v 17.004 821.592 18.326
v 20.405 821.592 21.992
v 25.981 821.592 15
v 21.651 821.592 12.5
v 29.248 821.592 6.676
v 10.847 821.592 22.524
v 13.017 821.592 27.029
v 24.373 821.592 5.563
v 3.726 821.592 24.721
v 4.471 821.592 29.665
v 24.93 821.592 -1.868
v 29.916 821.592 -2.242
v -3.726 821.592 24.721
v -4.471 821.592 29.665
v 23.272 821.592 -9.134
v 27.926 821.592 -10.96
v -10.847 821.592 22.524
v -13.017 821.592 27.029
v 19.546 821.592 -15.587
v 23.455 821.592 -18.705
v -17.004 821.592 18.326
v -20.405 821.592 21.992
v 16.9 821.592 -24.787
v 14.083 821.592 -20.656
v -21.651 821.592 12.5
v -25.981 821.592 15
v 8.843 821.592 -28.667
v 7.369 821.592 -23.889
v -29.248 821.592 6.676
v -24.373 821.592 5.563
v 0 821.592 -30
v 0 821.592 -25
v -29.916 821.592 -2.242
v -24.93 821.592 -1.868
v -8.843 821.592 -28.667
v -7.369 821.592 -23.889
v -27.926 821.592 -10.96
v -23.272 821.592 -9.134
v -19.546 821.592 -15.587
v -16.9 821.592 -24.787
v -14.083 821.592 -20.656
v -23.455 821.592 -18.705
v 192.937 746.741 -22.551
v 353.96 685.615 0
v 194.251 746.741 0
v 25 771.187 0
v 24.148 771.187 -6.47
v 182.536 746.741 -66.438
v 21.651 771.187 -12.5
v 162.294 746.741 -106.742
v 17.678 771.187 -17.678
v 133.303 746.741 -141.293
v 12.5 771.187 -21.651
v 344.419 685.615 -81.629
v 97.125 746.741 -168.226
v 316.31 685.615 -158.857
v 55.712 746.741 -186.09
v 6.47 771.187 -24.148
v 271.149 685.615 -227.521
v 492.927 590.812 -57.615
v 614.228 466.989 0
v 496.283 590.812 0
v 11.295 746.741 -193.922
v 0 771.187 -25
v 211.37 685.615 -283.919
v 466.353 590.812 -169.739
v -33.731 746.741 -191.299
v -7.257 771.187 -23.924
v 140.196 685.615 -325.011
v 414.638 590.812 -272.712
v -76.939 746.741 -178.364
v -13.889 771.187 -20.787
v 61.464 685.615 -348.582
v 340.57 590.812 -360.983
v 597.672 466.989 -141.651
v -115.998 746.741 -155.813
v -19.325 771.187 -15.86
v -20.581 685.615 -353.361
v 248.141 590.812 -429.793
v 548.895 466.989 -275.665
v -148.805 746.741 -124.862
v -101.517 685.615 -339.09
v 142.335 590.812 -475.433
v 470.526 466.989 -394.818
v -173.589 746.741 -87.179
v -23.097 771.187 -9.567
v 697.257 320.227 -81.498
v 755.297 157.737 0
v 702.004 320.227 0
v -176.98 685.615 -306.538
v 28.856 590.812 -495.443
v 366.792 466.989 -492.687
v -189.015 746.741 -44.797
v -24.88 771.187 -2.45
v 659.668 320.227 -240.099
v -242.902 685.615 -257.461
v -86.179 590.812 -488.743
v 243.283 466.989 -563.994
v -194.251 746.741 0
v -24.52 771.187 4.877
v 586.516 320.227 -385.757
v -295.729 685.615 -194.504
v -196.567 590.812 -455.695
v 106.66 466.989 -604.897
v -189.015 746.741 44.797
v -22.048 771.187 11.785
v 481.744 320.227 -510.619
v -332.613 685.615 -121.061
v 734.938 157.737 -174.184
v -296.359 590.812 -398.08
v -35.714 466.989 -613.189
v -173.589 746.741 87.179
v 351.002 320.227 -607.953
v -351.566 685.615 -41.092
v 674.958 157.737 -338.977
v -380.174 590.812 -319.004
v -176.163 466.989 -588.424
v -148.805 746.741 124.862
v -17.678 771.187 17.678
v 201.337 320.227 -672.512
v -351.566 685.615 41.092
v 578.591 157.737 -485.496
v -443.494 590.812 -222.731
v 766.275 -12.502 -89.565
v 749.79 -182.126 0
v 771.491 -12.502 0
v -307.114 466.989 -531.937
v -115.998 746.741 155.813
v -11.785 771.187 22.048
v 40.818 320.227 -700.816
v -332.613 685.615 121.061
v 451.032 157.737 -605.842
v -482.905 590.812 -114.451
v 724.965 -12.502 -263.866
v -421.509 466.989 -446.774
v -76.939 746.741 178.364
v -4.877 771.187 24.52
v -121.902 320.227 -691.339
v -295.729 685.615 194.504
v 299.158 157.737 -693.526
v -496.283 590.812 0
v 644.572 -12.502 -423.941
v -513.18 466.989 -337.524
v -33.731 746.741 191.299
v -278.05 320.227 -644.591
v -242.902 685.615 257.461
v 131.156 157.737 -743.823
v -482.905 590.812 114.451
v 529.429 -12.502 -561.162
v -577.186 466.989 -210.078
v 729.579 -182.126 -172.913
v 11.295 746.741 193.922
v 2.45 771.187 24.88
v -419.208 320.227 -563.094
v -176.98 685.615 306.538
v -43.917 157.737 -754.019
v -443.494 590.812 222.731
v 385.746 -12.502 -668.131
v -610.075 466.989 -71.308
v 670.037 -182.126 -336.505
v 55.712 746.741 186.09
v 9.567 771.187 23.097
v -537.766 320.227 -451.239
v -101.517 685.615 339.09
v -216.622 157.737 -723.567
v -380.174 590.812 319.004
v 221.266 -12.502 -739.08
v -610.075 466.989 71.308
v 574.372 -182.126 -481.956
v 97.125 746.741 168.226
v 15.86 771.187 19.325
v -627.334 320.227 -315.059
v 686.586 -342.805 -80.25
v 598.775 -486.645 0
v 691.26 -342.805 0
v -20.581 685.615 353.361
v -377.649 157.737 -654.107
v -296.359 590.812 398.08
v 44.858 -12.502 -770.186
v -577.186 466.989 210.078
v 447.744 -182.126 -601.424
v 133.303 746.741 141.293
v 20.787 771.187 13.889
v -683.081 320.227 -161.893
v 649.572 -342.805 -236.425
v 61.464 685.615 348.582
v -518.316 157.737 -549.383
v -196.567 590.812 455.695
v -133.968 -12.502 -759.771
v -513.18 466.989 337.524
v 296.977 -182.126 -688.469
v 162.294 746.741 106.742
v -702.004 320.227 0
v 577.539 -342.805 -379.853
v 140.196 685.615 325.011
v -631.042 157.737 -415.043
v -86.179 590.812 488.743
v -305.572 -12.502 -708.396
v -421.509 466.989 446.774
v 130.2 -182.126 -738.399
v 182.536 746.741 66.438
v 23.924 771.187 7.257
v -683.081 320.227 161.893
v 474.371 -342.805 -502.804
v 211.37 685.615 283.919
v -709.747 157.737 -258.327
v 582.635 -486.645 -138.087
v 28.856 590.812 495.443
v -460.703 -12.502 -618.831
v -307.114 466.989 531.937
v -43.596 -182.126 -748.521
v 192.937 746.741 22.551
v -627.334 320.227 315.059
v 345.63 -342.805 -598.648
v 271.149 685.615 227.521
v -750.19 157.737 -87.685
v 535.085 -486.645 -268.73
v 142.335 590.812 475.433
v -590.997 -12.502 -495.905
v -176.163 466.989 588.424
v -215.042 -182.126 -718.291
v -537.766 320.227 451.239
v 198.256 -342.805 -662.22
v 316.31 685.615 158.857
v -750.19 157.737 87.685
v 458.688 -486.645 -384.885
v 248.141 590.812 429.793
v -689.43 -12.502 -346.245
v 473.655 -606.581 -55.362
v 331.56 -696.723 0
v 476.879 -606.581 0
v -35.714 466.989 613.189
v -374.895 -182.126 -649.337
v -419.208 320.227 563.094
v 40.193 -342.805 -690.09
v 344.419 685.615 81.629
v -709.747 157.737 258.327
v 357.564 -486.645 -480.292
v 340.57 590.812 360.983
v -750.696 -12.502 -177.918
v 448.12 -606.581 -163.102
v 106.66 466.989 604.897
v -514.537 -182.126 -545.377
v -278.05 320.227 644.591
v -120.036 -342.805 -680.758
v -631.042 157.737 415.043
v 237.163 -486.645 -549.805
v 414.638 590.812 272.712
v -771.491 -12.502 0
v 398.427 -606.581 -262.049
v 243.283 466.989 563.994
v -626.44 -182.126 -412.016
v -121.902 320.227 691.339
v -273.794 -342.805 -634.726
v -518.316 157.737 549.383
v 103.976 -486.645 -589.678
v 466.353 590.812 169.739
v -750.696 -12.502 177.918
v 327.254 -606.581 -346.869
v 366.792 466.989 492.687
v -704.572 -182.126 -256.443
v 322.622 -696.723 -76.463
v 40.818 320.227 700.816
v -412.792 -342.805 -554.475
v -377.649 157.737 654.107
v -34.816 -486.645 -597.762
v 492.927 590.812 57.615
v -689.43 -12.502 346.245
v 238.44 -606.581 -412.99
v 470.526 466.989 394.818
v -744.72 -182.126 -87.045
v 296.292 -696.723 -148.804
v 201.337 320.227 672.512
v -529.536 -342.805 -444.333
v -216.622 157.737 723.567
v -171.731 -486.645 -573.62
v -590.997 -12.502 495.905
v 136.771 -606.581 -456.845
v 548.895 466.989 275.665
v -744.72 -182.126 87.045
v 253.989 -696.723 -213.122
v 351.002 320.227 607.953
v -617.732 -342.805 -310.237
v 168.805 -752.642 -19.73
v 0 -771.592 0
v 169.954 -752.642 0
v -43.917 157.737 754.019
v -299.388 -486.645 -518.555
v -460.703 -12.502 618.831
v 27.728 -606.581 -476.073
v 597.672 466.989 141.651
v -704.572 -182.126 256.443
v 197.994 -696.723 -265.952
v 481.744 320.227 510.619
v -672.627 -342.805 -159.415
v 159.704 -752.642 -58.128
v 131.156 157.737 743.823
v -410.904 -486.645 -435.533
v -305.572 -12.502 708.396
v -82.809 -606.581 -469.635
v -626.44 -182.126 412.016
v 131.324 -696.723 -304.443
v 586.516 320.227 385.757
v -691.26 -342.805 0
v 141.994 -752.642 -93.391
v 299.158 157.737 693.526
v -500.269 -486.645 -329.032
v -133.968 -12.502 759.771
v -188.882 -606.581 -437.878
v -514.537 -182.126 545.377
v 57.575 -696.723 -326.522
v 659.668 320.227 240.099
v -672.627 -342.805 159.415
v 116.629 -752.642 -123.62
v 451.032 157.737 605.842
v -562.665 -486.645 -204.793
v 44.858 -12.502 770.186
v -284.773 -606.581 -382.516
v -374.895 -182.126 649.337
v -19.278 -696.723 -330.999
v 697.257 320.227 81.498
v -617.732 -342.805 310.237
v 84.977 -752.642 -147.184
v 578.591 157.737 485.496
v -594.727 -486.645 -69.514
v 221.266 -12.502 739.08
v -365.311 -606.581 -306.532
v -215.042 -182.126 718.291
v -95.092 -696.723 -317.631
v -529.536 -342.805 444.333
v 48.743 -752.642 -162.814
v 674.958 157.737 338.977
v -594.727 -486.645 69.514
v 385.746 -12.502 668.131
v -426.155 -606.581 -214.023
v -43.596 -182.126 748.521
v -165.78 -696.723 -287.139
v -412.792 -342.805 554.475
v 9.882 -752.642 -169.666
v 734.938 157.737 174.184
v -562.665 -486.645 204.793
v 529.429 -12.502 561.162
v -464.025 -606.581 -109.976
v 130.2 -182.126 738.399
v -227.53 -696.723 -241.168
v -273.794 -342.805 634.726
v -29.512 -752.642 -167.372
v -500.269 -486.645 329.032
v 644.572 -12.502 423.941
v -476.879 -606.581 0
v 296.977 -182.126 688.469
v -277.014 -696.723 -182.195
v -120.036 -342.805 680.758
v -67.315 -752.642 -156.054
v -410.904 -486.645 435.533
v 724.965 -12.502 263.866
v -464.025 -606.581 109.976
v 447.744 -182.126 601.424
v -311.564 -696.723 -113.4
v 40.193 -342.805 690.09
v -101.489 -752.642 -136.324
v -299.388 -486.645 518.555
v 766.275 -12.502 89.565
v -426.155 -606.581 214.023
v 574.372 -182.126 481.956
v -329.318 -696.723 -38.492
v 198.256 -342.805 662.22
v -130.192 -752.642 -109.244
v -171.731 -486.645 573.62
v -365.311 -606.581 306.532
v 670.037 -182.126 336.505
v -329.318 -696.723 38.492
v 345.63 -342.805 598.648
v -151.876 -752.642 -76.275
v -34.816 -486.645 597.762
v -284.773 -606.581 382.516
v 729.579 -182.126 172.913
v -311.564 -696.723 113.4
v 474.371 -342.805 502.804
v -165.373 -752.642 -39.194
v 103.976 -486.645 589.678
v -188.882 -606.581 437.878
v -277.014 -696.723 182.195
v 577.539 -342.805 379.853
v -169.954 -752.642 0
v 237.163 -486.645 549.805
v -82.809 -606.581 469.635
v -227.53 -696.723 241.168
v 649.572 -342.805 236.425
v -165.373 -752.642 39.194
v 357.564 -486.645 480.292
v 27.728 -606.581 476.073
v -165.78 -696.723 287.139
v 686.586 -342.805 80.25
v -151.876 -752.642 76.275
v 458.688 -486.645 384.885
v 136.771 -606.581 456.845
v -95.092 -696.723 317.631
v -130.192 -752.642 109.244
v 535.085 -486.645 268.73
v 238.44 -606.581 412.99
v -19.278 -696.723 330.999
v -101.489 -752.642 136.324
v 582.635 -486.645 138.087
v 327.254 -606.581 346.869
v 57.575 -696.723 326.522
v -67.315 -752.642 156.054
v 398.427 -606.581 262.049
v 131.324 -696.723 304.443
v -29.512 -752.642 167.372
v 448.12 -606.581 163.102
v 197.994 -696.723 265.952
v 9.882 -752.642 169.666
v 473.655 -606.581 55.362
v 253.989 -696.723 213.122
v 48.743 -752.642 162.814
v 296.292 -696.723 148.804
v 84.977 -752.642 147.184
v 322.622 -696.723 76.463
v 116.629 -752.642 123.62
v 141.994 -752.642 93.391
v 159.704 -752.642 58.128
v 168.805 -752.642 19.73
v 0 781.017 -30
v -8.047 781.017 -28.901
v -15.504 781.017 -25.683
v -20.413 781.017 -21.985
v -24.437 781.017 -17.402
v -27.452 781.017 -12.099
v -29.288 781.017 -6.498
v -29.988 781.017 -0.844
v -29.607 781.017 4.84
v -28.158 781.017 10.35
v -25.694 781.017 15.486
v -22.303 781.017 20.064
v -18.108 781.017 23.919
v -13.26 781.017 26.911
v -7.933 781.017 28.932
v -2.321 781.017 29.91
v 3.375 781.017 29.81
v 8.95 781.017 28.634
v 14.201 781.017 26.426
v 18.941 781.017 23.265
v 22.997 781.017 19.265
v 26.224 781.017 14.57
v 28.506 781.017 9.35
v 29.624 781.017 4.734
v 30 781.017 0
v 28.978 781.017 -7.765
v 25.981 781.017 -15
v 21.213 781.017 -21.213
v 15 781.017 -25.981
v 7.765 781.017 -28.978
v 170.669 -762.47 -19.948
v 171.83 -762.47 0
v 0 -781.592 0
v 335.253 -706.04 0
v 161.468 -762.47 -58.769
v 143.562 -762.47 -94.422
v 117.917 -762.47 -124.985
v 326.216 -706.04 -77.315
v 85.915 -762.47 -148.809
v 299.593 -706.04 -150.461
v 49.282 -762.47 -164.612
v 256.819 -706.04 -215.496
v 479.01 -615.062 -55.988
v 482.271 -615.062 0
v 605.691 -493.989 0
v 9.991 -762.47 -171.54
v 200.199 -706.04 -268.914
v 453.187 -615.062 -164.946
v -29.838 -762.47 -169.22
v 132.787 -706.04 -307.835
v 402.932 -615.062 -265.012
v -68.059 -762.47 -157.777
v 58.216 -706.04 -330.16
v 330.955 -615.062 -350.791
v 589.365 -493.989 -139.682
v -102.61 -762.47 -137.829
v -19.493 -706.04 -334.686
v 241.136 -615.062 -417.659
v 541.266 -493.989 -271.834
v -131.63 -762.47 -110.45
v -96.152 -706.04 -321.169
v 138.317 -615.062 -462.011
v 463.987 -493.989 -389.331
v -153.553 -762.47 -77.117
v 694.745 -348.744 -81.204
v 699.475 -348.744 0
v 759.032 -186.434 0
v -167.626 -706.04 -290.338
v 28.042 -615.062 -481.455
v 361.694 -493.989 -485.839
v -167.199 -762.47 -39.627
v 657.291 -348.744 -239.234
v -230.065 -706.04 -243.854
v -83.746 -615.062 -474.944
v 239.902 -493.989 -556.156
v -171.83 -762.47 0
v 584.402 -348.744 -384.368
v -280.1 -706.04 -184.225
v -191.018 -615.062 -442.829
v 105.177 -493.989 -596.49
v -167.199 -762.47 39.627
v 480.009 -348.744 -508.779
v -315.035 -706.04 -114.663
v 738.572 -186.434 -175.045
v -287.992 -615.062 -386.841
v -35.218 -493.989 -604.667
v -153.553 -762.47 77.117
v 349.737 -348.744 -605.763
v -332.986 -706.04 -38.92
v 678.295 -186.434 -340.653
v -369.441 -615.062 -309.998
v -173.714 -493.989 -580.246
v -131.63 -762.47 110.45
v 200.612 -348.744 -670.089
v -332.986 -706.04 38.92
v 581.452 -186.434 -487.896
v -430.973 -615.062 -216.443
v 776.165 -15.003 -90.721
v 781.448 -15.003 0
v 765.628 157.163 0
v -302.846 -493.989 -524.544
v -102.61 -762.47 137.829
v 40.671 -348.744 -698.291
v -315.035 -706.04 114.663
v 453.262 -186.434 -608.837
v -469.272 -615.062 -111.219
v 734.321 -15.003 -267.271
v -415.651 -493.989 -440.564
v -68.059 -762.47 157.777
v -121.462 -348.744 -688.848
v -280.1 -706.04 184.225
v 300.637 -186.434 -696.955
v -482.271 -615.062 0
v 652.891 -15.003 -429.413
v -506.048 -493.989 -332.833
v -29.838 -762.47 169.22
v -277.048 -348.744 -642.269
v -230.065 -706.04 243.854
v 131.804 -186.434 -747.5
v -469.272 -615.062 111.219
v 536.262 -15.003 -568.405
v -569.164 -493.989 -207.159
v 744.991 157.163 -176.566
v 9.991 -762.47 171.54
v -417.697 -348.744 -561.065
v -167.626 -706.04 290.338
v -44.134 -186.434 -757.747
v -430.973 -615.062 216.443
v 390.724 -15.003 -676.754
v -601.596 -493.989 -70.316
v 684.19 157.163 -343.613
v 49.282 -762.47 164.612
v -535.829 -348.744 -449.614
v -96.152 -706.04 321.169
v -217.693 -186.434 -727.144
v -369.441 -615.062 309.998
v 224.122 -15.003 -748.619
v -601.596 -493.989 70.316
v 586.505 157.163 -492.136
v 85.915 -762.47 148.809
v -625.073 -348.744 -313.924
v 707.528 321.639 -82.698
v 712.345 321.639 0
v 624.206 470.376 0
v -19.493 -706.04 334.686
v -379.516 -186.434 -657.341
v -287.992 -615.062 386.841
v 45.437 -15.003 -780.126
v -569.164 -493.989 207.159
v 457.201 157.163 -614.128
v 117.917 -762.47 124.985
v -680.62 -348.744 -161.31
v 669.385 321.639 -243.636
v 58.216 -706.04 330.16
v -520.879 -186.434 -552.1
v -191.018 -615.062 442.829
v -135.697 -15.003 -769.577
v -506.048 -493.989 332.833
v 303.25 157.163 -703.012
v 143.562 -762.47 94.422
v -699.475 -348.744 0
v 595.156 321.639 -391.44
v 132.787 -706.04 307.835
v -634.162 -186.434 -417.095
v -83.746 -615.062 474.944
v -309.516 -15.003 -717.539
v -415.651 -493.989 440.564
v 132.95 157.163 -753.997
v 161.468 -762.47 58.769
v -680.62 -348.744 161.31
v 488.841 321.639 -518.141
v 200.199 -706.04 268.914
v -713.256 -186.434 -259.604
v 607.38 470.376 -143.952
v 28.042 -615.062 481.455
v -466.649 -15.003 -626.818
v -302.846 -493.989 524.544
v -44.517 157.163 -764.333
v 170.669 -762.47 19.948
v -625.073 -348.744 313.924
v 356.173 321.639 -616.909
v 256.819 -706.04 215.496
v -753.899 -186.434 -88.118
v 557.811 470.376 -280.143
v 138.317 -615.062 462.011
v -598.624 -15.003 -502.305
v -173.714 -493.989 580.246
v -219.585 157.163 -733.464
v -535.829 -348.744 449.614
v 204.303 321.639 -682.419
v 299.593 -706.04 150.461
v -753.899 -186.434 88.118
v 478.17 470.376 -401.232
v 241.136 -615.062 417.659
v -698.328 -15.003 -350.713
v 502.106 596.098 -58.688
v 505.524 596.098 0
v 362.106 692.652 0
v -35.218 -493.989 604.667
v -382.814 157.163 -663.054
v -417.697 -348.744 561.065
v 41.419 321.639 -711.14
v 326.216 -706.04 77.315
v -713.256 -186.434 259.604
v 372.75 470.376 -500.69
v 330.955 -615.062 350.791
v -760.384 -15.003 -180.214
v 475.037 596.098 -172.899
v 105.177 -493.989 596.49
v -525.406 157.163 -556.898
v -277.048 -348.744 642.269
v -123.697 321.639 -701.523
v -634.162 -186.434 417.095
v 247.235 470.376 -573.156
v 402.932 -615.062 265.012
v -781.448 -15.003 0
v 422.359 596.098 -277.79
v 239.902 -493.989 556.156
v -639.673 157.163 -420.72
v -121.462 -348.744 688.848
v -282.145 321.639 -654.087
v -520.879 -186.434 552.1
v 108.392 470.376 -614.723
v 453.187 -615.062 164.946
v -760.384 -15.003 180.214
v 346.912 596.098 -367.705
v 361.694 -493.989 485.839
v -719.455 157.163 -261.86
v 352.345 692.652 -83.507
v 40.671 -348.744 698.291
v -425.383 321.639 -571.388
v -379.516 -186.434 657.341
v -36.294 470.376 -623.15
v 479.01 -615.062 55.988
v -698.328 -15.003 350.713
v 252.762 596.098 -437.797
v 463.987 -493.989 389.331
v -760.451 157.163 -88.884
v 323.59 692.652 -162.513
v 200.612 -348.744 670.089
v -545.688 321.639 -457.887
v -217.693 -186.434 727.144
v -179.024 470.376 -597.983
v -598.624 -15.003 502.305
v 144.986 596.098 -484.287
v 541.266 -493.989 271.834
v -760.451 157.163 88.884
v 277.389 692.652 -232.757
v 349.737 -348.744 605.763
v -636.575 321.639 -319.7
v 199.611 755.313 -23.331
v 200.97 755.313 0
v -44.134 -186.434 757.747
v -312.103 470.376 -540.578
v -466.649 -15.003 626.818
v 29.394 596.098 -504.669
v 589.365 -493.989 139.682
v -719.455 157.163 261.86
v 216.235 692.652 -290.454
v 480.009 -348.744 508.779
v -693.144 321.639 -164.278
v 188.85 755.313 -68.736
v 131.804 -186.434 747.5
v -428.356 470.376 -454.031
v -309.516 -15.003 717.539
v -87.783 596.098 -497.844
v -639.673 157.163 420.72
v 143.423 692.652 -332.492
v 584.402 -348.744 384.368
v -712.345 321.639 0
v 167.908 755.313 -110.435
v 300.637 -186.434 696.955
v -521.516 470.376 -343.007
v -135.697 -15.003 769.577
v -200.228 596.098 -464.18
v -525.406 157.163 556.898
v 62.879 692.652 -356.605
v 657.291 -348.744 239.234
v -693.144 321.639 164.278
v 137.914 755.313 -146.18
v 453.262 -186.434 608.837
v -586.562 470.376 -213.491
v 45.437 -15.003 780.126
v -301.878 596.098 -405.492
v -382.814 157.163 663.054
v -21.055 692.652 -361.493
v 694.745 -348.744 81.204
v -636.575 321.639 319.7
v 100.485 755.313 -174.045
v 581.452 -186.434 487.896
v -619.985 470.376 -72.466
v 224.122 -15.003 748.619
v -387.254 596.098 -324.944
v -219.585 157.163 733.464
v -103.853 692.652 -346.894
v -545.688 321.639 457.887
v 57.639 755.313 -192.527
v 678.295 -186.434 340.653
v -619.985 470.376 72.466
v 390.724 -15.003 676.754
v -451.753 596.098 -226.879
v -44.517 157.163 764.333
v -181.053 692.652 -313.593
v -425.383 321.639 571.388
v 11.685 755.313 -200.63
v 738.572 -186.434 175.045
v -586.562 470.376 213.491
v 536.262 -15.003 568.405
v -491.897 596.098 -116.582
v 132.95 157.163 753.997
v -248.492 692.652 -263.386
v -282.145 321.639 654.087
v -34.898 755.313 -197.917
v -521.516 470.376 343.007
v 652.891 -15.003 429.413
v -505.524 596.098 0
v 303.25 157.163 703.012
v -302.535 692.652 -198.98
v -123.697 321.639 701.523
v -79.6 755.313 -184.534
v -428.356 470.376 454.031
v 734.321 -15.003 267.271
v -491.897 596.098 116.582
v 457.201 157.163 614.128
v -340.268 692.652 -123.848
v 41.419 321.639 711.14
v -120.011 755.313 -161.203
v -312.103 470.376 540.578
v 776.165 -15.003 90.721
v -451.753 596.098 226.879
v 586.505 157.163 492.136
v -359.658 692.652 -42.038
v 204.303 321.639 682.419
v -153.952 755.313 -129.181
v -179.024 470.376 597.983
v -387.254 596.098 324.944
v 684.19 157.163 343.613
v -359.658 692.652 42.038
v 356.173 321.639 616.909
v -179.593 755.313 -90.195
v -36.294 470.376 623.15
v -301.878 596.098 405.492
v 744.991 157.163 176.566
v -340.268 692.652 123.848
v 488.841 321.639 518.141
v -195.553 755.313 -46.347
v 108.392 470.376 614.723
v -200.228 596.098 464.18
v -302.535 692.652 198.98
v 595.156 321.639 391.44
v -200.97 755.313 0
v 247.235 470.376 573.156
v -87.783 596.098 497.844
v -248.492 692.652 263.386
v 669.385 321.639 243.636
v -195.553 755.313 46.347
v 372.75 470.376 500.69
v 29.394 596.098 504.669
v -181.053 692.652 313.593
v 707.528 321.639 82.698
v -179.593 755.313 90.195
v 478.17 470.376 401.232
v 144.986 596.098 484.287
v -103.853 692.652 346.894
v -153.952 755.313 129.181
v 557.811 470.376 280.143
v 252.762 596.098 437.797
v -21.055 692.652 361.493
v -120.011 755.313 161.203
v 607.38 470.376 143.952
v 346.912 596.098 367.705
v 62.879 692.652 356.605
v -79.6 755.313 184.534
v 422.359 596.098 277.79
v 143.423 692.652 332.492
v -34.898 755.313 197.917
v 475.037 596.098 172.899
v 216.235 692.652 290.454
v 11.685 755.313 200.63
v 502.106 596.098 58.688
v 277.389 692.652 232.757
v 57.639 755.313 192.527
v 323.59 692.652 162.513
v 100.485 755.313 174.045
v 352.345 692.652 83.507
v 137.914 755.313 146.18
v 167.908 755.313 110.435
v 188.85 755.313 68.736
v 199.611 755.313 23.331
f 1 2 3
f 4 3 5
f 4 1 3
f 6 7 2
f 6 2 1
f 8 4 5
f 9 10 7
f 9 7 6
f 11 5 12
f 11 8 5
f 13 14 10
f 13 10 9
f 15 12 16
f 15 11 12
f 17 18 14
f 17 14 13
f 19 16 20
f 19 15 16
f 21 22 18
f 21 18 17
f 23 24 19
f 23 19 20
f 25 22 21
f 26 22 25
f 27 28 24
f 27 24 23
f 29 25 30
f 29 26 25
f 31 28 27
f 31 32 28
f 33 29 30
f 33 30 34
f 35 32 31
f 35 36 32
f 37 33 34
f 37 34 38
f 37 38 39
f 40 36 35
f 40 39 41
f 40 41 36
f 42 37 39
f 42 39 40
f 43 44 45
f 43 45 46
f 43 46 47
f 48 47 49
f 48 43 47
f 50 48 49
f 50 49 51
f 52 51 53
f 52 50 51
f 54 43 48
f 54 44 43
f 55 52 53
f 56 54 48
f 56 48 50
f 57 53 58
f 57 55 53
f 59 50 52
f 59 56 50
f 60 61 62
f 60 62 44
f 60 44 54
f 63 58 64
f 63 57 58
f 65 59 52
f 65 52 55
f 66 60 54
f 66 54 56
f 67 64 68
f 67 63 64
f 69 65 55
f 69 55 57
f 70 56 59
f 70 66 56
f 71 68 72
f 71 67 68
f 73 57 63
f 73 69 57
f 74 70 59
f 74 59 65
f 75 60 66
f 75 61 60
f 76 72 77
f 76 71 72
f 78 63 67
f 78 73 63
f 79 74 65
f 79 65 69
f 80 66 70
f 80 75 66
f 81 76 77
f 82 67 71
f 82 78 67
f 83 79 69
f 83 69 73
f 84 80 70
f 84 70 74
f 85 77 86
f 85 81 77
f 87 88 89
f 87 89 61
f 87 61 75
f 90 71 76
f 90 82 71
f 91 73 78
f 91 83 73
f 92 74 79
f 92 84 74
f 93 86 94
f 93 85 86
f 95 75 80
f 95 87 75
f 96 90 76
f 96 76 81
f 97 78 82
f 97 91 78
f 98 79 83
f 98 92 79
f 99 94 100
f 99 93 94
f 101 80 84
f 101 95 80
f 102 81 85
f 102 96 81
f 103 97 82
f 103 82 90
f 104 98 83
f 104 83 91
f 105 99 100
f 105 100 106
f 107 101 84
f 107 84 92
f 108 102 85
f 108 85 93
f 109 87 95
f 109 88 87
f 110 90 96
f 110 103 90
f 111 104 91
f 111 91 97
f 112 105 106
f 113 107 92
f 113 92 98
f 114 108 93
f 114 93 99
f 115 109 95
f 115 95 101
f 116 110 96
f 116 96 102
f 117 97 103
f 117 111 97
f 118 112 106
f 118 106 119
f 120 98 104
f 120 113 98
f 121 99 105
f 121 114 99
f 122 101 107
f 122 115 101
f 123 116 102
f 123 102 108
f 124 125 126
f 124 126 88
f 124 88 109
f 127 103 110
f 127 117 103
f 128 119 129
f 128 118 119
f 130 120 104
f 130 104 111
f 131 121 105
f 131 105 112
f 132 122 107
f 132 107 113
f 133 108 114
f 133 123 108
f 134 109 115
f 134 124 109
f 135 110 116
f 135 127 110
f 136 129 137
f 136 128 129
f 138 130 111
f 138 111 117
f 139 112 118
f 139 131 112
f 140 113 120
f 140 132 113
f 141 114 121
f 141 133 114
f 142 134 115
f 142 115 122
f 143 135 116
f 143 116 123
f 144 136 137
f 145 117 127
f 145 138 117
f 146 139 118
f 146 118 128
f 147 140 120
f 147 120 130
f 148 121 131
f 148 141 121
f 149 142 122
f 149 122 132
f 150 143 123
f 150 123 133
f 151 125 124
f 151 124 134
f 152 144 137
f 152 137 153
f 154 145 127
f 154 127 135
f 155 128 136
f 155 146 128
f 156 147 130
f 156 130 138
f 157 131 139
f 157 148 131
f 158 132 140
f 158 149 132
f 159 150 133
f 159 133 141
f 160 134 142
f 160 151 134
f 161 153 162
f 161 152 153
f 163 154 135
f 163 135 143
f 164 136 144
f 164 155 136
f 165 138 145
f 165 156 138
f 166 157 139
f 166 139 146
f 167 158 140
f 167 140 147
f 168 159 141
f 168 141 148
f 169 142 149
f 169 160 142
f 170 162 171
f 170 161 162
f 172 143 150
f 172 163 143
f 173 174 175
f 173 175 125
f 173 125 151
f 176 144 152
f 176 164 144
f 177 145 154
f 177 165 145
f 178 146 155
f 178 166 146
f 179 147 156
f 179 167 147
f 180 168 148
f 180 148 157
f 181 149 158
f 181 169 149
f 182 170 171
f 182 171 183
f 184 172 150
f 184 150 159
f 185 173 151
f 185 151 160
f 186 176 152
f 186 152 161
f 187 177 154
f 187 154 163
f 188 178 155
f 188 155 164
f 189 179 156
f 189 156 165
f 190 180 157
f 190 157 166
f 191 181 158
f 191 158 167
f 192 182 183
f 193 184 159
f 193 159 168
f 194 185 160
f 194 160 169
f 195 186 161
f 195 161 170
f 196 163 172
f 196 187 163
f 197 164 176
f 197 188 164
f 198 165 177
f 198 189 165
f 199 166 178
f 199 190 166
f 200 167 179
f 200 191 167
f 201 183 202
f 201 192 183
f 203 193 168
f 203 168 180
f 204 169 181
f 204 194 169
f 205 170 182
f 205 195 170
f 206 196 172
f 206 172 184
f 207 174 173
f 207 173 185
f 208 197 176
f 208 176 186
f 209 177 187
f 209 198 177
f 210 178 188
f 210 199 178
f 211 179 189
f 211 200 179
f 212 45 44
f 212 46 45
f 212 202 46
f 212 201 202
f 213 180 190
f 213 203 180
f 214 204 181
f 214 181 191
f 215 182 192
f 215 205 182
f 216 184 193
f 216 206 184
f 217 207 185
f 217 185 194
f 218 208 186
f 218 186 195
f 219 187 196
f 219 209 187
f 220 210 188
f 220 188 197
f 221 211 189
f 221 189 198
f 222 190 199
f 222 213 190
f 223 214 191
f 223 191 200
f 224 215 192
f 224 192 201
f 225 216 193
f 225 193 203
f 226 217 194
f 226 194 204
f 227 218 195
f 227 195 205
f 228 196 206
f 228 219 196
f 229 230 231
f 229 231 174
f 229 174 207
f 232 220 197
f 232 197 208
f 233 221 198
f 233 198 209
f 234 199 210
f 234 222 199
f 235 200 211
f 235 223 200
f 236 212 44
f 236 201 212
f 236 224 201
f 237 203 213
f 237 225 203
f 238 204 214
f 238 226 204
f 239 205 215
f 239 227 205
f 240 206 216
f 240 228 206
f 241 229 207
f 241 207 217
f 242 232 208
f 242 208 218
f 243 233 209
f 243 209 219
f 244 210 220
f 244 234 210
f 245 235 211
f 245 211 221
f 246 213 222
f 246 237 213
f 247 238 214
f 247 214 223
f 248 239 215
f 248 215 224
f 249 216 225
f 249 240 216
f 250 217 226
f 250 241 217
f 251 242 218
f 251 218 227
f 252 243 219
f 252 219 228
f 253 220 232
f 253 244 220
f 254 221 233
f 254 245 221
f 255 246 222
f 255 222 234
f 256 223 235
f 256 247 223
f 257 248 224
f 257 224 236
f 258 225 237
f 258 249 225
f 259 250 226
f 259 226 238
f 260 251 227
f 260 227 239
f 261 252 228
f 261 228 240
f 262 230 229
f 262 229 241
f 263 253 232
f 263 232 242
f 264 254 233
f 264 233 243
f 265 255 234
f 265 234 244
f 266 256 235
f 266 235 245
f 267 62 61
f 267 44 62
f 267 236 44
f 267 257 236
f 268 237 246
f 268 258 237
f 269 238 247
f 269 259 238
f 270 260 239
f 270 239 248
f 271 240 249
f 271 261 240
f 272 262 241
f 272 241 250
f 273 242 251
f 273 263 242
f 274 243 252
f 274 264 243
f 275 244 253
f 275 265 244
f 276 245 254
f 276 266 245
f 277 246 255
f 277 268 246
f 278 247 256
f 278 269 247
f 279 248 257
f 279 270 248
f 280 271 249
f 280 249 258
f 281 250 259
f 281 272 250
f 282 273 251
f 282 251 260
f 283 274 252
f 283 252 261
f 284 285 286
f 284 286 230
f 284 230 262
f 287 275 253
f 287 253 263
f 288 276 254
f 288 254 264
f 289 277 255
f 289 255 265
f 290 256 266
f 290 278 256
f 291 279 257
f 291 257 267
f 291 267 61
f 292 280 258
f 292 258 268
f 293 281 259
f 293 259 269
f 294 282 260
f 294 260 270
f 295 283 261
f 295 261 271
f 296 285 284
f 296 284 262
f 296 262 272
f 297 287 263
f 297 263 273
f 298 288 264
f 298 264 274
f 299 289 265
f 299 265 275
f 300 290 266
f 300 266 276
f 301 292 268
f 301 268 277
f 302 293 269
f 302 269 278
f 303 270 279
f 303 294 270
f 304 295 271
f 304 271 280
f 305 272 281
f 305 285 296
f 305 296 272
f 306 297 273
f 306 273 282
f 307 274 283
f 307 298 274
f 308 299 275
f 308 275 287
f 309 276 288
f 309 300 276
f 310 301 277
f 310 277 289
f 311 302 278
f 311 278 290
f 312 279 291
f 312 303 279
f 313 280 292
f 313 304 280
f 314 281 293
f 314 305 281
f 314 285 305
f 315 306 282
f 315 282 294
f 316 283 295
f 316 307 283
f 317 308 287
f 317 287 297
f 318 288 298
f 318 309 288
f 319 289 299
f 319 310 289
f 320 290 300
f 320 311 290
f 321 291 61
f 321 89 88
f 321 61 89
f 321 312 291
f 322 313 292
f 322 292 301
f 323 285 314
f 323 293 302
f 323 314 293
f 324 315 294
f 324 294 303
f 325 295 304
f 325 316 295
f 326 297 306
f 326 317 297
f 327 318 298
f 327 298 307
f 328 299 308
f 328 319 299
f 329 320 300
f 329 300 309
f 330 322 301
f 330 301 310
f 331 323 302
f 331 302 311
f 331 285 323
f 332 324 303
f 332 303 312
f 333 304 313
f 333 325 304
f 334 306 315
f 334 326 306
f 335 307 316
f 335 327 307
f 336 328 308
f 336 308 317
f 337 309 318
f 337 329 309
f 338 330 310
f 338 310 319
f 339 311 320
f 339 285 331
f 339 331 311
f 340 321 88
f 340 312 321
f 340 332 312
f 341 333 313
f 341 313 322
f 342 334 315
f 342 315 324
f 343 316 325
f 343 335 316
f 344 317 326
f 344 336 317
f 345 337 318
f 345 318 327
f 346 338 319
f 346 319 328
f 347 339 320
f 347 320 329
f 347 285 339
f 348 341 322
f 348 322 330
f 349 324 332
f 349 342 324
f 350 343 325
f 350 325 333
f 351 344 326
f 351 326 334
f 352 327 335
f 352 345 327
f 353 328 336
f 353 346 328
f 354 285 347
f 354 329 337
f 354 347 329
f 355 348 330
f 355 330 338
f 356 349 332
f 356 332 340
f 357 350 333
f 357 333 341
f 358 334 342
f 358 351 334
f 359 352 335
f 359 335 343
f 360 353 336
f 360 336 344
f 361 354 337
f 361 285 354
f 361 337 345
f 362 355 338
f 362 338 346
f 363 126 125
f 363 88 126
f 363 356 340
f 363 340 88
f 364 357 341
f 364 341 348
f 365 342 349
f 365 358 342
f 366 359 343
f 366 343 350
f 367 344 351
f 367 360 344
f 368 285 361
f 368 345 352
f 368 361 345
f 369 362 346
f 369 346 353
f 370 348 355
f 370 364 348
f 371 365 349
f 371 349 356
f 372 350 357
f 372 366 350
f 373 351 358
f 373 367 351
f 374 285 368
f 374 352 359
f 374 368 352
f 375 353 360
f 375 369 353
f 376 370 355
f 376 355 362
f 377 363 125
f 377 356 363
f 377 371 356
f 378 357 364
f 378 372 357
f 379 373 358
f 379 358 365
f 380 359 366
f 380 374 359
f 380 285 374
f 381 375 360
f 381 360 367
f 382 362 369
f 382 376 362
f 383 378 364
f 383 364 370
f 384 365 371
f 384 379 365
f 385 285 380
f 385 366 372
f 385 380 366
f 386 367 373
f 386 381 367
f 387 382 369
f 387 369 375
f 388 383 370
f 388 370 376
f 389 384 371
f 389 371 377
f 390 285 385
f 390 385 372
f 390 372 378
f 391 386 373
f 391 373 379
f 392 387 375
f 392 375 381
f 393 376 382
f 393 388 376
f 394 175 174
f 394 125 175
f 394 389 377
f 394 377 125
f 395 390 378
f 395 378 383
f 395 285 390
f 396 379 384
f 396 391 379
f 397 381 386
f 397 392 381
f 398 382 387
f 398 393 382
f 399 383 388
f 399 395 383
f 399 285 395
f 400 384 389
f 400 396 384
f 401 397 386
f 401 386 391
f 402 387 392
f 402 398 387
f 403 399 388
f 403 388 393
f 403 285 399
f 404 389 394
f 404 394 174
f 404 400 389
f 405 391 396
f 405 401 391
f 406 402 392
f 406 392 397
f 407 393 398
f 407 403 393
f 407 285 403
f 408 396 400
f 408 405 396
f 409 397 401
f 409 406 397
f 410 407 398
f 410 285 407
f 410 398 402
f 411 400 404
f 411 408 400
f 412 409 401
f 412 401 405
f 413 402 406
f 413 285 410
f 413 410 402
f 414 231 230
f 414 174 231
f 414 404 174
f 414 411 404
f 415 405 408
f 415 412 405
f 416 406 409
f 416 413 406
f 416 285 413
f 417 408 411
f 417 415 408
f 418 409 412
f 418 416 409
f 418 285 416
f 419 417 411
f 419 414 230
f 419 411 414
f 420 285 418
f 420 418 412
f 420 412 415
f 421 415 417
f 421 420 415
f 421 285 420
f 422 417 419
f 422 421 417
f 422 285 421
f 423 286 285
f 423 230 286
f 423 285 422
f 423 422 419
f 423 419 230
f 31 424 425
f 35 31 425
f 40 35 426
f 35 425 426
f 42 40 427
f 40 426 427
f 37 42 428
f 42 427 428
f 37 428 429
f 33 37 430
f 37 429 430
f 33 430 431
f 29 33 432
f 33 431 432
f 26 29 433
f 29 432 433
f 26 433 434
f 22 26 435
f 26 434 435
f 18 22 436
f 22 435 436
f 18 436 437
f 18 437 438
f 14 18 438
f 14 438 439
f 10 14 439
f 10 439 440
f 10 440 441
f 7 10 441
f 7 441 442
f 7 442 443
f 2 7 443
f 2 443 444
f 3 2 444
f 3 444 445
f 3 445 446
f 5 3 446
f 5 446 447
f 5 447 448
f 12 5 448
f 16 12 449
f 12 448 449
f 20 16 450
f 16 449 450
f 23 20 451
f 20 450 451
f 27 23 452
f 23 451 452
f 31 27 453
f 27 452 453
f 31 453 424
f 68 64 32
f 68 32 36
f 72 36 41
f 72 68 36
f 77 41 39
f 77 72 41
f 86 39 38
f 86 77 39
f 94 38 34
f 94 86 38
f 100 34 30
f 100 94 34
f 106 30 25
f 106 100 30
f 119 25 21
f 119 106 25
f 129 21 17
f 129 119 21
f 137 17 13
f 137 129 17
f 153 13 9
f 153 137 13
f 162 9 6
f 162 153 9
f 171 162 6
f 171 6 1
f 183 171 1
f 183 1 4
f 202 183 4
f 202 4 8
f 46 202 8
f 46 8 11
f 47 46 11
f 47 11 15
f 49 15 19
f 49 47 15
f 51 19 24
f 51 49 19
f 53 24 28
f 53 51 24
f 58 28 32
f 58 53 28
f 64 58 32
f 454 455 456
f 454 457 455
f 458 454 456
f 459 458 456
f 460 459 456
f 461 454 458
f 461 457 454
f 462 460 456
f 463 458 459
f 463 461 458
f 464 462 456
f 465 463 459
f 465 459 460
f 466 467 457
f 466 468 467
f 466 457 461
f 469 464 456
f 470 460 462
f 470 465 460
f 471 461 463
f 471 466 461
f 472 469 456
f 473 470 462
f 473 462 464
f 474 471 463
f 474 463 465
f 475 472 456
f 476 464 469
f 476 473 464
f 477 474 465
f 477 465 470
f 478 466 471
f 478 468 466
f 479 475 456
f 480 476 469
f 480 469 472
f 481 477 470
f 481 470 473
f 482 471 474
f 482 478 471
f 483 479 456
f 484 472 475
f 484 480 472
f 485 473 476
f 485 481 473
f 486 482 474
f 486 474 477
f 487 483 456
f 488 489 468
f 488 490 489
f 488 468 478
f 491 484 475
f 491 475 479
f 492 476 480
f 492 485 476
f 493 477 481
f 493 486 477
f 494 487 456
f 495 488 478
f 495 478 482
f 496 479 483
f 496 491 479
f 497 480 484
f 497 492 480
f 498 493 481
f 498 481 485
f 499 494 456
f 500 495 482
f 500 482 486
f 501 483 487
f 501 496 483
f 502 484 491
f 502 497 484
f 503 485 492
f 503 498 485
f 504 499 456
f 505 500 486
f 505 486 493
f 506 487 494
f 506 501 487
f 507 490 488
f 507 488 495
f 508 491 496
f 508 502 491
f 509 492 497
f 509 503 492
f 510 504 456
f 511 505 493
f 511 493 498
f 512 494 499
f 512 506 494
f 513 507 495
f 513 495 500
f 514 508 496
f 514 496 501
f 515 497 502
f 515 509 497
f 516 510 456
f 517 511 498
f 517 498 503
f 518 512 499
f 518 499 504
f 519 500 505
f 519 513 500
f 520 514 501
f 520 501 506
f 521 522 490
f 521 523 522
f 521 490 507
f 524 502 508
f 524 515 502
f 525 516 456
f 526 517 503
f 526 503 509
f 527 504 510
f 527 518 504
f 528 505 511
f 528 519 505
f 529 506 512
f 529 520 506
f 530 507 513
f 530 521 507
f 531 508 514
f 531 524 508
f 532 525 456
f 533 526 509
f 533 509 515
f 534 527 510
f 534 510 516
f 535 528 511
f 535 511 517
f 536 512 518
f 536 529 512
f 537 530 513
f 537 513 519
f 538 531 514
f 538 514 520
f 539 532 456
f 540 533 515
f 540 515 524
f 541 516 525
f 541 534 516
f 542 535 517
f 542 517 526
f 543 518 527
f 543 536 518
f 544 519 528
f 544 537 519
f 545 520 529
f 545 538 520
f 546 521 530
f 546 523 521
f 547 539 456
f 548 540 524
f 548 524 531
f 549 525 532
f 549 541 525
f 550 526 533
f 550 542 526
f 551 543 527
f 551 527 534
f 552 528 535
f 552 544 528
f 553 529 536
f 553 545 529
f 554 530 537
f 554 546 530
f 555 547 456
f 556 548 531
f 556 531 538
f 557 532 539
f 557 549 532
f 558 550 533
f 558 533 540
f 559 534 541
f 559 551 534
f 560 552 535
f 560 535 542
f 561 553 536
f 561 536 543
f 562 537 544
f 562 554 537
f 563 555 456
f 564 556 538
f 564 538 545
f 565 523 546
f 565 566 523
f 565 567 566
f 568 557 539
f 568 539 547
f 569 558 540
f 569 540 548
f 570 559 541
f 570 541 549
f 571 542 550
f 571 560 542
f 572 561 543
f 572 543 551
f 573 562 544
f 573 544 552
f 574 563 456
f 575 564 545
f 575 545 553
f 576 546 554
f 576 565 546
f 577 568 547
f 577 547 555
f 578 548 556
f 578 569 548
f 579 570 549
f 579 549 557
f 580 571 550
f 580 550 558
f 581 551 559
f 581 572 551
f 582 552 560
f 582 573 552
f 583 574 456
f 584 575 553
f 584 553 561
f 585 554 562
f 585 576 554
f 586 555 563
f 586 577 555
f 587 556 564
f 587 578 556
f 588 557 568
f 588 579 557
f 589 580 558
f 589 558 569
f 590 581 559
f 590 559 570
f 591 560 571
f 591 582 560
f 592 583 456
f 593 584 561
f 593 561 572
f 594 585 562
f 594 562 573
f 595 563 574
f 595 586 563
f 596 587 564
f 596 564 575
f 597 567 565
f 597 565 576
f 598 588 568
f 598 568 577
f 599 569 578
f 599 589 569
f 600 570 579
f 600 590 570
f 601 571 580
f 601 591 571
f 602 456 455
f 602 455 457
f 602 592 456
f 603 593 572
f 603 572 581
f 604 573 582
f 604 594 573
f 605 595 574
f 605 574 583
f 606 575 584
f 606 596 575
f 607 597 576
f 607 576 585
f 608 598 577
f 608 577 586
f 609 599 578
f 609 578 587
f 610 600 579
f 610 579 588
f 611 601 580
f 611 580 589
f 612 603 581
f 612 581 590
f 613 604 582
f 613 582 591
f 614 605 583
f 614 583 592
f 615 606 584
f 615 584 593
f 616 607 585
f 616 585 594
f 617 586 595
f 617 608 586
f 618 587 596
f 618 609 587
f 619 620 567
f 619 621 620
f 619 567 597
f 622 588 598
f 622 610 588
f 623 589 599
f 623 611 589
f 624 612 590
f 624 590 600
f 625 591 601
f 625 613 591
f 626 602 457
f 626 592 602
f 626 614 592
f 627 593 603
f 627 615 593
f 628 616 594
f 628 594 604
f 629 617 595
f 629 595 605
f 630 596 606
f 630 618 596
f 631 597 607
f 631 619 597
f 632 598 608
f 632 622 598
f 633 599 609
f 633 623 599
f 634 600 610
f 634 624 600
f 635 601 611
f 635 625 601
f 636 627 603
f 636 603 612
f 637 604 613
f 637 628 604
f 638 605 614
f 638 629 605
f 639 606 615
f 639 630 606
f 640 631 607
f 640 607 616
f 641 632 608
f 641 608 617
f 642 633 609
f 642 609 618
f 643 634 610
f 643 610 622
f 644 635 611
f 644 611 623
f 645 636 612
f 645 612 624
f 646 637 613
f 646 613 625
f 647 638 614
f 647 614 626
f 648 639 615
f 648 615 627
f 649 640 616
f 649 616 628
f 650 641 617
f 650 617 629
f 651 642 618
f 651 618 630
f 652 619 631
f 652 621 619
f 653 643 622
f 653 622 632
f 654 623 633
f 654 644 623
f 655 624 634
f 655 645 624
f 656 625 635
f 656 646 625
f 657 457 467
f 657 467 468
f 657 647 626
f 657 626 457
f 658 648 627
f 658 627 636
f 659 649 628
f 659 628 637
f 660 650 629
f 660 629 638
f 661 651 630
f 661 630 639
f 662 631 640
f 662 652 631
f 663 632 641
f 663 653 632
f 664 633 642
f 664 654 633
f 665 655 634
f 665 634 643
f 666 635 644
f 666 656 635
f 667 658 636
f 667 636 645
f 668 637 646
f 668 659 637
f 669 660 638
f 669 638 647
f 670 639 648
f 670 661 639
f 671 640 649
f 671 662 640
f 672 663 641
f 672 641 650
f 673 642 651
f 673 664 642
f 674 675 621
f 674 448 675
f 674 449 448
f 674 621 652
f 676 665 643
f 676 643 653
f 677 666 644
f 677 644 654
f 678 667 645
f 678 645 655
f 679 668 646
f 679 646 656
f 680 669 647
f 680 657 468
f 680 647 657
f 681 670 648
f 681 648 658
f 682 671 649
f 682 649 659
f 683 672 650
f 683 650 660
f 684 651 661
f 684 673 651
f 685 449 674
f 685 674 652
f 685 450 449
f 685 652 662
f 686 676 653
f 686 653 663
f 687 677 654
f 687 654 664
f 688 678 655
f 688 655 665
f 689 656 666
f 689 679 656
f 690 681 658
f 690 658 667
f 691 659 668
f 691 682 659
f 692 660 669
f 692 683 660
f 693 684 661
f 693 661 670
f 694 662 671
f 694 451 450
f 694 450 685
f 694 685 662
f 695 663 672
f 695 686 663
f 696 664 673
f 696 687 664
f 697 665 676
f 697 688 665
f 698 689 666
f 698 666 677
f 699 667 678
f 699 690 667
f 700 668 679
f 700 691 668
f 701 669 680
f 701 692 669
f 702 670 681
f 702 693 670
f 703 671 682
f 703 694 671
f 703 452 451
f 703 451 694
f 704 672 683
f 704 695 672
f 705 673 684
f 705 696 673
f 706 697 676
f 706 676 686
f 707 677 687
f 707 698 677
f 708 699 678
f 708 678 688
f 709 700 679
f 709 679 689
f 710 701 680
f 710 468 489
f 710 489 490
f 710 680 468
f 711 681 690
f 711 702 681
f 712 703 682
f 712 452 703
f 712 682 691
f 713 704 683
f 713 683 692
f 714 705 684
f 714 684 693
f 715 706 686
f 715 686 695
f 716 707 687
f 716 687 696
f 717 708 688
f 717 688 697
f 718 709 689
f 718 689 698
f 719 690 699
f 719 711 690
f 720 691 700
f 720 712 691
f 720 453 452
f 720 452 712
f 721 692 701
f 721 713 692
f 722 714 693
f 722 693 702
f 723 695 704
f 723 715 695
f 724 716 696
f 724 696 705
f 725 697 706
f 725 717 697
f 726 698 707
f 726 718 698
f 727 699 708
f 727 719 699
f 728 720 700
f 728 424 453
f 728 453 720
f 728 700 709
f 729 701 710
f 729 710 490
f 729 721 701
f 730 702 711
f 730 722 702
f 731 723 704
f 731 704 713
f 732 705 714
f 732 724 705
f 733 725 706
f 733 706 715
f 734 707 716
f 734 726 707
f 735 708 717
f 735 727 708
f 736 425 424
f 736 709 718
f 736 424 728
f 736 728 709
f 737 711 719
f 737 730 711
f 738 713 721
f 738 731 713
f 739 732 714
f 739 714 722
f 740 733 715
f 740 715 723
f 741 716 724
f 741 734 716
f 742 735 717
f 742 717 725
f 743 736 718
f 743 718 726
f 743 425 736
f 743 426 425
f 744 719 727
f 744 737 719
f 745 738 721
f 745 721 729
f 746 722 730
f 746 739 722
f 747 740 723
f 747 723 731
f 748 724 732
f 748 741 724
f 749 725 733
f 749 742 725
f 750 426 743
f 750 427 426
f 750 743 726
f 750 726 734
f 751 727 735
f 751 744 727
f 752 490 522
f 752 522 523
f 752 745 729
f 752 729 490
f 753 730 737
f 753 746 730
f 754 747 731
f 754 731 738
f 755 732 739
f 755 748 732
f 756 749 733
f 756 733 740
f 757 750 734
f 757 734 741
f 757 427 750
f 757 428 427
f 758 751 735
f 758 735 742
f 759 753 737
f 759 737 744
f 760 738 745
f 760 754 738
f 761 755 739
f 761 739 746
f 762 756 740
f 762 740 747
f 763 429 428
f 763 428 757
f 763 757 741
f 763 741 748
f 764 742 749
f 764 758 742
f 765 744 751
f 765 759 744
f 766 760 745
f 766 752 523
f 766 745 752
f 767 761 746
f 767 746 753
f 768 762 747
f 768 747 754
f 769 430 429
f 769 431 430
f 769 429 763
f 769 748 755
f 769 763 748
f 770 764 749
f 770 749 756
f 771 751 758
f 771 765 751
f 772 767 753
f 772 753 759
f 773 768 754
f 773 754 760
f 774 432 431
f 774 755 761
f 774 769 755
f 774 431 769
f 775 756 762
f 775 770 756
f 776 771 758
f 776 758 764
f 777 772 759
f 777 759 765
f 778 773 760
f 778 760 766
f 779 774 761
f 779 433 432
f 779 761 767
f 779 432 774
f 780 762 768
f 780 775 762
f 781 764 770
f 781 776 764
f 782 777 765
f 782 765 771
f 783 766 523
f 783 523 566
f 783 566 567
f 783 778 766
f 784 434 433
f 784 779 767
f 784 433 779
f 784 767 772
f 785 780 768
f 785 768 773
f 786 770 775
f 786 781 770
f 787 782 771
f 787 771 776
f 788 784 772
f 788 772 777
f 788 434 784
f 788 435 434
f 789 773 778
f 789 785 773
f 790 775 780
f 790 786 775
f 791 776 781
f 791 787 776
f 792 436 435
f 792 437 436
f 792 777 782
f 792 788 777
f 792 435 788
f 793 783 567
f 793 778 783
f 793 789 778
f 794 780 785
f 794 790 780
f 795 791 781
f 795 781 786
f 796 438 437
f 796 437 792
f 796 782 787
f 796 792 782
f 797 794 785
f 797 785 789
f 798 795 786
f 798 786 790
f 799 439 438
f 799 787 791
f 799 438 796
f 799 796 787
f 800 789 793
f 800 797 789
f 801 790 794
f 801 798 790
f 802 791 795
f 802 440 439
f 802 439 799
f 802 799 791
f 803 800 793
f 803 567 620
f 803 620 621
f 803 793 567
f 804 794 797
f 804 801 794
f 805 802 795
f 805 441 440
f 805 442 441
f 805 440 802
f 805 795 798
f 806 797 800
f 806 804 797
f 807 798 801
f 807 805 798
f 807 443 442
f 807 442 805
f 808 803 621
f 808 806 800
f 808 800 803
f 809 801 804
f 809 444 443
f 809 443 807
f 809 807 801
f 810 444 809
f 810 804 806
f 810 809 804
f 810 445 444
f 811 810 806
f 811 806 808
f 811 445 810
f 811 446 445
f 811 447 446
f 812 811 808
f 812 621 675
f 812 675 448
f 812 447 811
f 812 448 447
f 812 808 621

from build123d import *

# Parameters (mm, degrees)
SKETCH76_R          = 30
BOSS_EXTRUDE1_DEPTH = 50
SKETCH78_R          = 25
CUT_EXTRUDE1_DEPTH  = 1378.239234241


with BuildPart() as part:
    # Sketch74 → Revolve4 (revolve)
    with BuildSketch(Plane.XY):
        with BuildLine():
            Line((0, 781.5925), (0, 771.5925))
            ThreePointArc((0, 771.5925), (771.5925, 0), (0, -771.5925))
            Line((0, -771.5925), (0, -781.5925))
            ThreePointArc((0, -781.5925), (781.5925, 0), (0, 781.5925))
        make_face()
    revolve(axis=Axis((0, 0, 0), (0, 1, 0)))

    # Sketch76 → Boss-Extrude1 (add)
    with BuildSketch(Plane(origin=(0, 771.5925, 0), x_dir=(1, 0, 0), z_dir=(0, 1, 0))):
        with Locations(Location((0, 0, 0), (0, 0, 90))):
            Circle(SKETCH76_R)
    extrude(amount=BOSS_EXTRUDE1_DEPTH)

    # Sketch78 → Cut-Extrude1 (cut, through all)
    with BuildSketch(Plane(origin=(0, 0, 0), x_dir=(1, 0, 0), z_dir=(0, 1, 0))):
        with Locations(Location((0, 0, 0), (0, 0, 90))):
            Circle(SKETCH78_R)
    extrude(amount=CUT_EXTRUDE1_DEPTH, mode=Mode.SUBTRACT)


solid = part.part
